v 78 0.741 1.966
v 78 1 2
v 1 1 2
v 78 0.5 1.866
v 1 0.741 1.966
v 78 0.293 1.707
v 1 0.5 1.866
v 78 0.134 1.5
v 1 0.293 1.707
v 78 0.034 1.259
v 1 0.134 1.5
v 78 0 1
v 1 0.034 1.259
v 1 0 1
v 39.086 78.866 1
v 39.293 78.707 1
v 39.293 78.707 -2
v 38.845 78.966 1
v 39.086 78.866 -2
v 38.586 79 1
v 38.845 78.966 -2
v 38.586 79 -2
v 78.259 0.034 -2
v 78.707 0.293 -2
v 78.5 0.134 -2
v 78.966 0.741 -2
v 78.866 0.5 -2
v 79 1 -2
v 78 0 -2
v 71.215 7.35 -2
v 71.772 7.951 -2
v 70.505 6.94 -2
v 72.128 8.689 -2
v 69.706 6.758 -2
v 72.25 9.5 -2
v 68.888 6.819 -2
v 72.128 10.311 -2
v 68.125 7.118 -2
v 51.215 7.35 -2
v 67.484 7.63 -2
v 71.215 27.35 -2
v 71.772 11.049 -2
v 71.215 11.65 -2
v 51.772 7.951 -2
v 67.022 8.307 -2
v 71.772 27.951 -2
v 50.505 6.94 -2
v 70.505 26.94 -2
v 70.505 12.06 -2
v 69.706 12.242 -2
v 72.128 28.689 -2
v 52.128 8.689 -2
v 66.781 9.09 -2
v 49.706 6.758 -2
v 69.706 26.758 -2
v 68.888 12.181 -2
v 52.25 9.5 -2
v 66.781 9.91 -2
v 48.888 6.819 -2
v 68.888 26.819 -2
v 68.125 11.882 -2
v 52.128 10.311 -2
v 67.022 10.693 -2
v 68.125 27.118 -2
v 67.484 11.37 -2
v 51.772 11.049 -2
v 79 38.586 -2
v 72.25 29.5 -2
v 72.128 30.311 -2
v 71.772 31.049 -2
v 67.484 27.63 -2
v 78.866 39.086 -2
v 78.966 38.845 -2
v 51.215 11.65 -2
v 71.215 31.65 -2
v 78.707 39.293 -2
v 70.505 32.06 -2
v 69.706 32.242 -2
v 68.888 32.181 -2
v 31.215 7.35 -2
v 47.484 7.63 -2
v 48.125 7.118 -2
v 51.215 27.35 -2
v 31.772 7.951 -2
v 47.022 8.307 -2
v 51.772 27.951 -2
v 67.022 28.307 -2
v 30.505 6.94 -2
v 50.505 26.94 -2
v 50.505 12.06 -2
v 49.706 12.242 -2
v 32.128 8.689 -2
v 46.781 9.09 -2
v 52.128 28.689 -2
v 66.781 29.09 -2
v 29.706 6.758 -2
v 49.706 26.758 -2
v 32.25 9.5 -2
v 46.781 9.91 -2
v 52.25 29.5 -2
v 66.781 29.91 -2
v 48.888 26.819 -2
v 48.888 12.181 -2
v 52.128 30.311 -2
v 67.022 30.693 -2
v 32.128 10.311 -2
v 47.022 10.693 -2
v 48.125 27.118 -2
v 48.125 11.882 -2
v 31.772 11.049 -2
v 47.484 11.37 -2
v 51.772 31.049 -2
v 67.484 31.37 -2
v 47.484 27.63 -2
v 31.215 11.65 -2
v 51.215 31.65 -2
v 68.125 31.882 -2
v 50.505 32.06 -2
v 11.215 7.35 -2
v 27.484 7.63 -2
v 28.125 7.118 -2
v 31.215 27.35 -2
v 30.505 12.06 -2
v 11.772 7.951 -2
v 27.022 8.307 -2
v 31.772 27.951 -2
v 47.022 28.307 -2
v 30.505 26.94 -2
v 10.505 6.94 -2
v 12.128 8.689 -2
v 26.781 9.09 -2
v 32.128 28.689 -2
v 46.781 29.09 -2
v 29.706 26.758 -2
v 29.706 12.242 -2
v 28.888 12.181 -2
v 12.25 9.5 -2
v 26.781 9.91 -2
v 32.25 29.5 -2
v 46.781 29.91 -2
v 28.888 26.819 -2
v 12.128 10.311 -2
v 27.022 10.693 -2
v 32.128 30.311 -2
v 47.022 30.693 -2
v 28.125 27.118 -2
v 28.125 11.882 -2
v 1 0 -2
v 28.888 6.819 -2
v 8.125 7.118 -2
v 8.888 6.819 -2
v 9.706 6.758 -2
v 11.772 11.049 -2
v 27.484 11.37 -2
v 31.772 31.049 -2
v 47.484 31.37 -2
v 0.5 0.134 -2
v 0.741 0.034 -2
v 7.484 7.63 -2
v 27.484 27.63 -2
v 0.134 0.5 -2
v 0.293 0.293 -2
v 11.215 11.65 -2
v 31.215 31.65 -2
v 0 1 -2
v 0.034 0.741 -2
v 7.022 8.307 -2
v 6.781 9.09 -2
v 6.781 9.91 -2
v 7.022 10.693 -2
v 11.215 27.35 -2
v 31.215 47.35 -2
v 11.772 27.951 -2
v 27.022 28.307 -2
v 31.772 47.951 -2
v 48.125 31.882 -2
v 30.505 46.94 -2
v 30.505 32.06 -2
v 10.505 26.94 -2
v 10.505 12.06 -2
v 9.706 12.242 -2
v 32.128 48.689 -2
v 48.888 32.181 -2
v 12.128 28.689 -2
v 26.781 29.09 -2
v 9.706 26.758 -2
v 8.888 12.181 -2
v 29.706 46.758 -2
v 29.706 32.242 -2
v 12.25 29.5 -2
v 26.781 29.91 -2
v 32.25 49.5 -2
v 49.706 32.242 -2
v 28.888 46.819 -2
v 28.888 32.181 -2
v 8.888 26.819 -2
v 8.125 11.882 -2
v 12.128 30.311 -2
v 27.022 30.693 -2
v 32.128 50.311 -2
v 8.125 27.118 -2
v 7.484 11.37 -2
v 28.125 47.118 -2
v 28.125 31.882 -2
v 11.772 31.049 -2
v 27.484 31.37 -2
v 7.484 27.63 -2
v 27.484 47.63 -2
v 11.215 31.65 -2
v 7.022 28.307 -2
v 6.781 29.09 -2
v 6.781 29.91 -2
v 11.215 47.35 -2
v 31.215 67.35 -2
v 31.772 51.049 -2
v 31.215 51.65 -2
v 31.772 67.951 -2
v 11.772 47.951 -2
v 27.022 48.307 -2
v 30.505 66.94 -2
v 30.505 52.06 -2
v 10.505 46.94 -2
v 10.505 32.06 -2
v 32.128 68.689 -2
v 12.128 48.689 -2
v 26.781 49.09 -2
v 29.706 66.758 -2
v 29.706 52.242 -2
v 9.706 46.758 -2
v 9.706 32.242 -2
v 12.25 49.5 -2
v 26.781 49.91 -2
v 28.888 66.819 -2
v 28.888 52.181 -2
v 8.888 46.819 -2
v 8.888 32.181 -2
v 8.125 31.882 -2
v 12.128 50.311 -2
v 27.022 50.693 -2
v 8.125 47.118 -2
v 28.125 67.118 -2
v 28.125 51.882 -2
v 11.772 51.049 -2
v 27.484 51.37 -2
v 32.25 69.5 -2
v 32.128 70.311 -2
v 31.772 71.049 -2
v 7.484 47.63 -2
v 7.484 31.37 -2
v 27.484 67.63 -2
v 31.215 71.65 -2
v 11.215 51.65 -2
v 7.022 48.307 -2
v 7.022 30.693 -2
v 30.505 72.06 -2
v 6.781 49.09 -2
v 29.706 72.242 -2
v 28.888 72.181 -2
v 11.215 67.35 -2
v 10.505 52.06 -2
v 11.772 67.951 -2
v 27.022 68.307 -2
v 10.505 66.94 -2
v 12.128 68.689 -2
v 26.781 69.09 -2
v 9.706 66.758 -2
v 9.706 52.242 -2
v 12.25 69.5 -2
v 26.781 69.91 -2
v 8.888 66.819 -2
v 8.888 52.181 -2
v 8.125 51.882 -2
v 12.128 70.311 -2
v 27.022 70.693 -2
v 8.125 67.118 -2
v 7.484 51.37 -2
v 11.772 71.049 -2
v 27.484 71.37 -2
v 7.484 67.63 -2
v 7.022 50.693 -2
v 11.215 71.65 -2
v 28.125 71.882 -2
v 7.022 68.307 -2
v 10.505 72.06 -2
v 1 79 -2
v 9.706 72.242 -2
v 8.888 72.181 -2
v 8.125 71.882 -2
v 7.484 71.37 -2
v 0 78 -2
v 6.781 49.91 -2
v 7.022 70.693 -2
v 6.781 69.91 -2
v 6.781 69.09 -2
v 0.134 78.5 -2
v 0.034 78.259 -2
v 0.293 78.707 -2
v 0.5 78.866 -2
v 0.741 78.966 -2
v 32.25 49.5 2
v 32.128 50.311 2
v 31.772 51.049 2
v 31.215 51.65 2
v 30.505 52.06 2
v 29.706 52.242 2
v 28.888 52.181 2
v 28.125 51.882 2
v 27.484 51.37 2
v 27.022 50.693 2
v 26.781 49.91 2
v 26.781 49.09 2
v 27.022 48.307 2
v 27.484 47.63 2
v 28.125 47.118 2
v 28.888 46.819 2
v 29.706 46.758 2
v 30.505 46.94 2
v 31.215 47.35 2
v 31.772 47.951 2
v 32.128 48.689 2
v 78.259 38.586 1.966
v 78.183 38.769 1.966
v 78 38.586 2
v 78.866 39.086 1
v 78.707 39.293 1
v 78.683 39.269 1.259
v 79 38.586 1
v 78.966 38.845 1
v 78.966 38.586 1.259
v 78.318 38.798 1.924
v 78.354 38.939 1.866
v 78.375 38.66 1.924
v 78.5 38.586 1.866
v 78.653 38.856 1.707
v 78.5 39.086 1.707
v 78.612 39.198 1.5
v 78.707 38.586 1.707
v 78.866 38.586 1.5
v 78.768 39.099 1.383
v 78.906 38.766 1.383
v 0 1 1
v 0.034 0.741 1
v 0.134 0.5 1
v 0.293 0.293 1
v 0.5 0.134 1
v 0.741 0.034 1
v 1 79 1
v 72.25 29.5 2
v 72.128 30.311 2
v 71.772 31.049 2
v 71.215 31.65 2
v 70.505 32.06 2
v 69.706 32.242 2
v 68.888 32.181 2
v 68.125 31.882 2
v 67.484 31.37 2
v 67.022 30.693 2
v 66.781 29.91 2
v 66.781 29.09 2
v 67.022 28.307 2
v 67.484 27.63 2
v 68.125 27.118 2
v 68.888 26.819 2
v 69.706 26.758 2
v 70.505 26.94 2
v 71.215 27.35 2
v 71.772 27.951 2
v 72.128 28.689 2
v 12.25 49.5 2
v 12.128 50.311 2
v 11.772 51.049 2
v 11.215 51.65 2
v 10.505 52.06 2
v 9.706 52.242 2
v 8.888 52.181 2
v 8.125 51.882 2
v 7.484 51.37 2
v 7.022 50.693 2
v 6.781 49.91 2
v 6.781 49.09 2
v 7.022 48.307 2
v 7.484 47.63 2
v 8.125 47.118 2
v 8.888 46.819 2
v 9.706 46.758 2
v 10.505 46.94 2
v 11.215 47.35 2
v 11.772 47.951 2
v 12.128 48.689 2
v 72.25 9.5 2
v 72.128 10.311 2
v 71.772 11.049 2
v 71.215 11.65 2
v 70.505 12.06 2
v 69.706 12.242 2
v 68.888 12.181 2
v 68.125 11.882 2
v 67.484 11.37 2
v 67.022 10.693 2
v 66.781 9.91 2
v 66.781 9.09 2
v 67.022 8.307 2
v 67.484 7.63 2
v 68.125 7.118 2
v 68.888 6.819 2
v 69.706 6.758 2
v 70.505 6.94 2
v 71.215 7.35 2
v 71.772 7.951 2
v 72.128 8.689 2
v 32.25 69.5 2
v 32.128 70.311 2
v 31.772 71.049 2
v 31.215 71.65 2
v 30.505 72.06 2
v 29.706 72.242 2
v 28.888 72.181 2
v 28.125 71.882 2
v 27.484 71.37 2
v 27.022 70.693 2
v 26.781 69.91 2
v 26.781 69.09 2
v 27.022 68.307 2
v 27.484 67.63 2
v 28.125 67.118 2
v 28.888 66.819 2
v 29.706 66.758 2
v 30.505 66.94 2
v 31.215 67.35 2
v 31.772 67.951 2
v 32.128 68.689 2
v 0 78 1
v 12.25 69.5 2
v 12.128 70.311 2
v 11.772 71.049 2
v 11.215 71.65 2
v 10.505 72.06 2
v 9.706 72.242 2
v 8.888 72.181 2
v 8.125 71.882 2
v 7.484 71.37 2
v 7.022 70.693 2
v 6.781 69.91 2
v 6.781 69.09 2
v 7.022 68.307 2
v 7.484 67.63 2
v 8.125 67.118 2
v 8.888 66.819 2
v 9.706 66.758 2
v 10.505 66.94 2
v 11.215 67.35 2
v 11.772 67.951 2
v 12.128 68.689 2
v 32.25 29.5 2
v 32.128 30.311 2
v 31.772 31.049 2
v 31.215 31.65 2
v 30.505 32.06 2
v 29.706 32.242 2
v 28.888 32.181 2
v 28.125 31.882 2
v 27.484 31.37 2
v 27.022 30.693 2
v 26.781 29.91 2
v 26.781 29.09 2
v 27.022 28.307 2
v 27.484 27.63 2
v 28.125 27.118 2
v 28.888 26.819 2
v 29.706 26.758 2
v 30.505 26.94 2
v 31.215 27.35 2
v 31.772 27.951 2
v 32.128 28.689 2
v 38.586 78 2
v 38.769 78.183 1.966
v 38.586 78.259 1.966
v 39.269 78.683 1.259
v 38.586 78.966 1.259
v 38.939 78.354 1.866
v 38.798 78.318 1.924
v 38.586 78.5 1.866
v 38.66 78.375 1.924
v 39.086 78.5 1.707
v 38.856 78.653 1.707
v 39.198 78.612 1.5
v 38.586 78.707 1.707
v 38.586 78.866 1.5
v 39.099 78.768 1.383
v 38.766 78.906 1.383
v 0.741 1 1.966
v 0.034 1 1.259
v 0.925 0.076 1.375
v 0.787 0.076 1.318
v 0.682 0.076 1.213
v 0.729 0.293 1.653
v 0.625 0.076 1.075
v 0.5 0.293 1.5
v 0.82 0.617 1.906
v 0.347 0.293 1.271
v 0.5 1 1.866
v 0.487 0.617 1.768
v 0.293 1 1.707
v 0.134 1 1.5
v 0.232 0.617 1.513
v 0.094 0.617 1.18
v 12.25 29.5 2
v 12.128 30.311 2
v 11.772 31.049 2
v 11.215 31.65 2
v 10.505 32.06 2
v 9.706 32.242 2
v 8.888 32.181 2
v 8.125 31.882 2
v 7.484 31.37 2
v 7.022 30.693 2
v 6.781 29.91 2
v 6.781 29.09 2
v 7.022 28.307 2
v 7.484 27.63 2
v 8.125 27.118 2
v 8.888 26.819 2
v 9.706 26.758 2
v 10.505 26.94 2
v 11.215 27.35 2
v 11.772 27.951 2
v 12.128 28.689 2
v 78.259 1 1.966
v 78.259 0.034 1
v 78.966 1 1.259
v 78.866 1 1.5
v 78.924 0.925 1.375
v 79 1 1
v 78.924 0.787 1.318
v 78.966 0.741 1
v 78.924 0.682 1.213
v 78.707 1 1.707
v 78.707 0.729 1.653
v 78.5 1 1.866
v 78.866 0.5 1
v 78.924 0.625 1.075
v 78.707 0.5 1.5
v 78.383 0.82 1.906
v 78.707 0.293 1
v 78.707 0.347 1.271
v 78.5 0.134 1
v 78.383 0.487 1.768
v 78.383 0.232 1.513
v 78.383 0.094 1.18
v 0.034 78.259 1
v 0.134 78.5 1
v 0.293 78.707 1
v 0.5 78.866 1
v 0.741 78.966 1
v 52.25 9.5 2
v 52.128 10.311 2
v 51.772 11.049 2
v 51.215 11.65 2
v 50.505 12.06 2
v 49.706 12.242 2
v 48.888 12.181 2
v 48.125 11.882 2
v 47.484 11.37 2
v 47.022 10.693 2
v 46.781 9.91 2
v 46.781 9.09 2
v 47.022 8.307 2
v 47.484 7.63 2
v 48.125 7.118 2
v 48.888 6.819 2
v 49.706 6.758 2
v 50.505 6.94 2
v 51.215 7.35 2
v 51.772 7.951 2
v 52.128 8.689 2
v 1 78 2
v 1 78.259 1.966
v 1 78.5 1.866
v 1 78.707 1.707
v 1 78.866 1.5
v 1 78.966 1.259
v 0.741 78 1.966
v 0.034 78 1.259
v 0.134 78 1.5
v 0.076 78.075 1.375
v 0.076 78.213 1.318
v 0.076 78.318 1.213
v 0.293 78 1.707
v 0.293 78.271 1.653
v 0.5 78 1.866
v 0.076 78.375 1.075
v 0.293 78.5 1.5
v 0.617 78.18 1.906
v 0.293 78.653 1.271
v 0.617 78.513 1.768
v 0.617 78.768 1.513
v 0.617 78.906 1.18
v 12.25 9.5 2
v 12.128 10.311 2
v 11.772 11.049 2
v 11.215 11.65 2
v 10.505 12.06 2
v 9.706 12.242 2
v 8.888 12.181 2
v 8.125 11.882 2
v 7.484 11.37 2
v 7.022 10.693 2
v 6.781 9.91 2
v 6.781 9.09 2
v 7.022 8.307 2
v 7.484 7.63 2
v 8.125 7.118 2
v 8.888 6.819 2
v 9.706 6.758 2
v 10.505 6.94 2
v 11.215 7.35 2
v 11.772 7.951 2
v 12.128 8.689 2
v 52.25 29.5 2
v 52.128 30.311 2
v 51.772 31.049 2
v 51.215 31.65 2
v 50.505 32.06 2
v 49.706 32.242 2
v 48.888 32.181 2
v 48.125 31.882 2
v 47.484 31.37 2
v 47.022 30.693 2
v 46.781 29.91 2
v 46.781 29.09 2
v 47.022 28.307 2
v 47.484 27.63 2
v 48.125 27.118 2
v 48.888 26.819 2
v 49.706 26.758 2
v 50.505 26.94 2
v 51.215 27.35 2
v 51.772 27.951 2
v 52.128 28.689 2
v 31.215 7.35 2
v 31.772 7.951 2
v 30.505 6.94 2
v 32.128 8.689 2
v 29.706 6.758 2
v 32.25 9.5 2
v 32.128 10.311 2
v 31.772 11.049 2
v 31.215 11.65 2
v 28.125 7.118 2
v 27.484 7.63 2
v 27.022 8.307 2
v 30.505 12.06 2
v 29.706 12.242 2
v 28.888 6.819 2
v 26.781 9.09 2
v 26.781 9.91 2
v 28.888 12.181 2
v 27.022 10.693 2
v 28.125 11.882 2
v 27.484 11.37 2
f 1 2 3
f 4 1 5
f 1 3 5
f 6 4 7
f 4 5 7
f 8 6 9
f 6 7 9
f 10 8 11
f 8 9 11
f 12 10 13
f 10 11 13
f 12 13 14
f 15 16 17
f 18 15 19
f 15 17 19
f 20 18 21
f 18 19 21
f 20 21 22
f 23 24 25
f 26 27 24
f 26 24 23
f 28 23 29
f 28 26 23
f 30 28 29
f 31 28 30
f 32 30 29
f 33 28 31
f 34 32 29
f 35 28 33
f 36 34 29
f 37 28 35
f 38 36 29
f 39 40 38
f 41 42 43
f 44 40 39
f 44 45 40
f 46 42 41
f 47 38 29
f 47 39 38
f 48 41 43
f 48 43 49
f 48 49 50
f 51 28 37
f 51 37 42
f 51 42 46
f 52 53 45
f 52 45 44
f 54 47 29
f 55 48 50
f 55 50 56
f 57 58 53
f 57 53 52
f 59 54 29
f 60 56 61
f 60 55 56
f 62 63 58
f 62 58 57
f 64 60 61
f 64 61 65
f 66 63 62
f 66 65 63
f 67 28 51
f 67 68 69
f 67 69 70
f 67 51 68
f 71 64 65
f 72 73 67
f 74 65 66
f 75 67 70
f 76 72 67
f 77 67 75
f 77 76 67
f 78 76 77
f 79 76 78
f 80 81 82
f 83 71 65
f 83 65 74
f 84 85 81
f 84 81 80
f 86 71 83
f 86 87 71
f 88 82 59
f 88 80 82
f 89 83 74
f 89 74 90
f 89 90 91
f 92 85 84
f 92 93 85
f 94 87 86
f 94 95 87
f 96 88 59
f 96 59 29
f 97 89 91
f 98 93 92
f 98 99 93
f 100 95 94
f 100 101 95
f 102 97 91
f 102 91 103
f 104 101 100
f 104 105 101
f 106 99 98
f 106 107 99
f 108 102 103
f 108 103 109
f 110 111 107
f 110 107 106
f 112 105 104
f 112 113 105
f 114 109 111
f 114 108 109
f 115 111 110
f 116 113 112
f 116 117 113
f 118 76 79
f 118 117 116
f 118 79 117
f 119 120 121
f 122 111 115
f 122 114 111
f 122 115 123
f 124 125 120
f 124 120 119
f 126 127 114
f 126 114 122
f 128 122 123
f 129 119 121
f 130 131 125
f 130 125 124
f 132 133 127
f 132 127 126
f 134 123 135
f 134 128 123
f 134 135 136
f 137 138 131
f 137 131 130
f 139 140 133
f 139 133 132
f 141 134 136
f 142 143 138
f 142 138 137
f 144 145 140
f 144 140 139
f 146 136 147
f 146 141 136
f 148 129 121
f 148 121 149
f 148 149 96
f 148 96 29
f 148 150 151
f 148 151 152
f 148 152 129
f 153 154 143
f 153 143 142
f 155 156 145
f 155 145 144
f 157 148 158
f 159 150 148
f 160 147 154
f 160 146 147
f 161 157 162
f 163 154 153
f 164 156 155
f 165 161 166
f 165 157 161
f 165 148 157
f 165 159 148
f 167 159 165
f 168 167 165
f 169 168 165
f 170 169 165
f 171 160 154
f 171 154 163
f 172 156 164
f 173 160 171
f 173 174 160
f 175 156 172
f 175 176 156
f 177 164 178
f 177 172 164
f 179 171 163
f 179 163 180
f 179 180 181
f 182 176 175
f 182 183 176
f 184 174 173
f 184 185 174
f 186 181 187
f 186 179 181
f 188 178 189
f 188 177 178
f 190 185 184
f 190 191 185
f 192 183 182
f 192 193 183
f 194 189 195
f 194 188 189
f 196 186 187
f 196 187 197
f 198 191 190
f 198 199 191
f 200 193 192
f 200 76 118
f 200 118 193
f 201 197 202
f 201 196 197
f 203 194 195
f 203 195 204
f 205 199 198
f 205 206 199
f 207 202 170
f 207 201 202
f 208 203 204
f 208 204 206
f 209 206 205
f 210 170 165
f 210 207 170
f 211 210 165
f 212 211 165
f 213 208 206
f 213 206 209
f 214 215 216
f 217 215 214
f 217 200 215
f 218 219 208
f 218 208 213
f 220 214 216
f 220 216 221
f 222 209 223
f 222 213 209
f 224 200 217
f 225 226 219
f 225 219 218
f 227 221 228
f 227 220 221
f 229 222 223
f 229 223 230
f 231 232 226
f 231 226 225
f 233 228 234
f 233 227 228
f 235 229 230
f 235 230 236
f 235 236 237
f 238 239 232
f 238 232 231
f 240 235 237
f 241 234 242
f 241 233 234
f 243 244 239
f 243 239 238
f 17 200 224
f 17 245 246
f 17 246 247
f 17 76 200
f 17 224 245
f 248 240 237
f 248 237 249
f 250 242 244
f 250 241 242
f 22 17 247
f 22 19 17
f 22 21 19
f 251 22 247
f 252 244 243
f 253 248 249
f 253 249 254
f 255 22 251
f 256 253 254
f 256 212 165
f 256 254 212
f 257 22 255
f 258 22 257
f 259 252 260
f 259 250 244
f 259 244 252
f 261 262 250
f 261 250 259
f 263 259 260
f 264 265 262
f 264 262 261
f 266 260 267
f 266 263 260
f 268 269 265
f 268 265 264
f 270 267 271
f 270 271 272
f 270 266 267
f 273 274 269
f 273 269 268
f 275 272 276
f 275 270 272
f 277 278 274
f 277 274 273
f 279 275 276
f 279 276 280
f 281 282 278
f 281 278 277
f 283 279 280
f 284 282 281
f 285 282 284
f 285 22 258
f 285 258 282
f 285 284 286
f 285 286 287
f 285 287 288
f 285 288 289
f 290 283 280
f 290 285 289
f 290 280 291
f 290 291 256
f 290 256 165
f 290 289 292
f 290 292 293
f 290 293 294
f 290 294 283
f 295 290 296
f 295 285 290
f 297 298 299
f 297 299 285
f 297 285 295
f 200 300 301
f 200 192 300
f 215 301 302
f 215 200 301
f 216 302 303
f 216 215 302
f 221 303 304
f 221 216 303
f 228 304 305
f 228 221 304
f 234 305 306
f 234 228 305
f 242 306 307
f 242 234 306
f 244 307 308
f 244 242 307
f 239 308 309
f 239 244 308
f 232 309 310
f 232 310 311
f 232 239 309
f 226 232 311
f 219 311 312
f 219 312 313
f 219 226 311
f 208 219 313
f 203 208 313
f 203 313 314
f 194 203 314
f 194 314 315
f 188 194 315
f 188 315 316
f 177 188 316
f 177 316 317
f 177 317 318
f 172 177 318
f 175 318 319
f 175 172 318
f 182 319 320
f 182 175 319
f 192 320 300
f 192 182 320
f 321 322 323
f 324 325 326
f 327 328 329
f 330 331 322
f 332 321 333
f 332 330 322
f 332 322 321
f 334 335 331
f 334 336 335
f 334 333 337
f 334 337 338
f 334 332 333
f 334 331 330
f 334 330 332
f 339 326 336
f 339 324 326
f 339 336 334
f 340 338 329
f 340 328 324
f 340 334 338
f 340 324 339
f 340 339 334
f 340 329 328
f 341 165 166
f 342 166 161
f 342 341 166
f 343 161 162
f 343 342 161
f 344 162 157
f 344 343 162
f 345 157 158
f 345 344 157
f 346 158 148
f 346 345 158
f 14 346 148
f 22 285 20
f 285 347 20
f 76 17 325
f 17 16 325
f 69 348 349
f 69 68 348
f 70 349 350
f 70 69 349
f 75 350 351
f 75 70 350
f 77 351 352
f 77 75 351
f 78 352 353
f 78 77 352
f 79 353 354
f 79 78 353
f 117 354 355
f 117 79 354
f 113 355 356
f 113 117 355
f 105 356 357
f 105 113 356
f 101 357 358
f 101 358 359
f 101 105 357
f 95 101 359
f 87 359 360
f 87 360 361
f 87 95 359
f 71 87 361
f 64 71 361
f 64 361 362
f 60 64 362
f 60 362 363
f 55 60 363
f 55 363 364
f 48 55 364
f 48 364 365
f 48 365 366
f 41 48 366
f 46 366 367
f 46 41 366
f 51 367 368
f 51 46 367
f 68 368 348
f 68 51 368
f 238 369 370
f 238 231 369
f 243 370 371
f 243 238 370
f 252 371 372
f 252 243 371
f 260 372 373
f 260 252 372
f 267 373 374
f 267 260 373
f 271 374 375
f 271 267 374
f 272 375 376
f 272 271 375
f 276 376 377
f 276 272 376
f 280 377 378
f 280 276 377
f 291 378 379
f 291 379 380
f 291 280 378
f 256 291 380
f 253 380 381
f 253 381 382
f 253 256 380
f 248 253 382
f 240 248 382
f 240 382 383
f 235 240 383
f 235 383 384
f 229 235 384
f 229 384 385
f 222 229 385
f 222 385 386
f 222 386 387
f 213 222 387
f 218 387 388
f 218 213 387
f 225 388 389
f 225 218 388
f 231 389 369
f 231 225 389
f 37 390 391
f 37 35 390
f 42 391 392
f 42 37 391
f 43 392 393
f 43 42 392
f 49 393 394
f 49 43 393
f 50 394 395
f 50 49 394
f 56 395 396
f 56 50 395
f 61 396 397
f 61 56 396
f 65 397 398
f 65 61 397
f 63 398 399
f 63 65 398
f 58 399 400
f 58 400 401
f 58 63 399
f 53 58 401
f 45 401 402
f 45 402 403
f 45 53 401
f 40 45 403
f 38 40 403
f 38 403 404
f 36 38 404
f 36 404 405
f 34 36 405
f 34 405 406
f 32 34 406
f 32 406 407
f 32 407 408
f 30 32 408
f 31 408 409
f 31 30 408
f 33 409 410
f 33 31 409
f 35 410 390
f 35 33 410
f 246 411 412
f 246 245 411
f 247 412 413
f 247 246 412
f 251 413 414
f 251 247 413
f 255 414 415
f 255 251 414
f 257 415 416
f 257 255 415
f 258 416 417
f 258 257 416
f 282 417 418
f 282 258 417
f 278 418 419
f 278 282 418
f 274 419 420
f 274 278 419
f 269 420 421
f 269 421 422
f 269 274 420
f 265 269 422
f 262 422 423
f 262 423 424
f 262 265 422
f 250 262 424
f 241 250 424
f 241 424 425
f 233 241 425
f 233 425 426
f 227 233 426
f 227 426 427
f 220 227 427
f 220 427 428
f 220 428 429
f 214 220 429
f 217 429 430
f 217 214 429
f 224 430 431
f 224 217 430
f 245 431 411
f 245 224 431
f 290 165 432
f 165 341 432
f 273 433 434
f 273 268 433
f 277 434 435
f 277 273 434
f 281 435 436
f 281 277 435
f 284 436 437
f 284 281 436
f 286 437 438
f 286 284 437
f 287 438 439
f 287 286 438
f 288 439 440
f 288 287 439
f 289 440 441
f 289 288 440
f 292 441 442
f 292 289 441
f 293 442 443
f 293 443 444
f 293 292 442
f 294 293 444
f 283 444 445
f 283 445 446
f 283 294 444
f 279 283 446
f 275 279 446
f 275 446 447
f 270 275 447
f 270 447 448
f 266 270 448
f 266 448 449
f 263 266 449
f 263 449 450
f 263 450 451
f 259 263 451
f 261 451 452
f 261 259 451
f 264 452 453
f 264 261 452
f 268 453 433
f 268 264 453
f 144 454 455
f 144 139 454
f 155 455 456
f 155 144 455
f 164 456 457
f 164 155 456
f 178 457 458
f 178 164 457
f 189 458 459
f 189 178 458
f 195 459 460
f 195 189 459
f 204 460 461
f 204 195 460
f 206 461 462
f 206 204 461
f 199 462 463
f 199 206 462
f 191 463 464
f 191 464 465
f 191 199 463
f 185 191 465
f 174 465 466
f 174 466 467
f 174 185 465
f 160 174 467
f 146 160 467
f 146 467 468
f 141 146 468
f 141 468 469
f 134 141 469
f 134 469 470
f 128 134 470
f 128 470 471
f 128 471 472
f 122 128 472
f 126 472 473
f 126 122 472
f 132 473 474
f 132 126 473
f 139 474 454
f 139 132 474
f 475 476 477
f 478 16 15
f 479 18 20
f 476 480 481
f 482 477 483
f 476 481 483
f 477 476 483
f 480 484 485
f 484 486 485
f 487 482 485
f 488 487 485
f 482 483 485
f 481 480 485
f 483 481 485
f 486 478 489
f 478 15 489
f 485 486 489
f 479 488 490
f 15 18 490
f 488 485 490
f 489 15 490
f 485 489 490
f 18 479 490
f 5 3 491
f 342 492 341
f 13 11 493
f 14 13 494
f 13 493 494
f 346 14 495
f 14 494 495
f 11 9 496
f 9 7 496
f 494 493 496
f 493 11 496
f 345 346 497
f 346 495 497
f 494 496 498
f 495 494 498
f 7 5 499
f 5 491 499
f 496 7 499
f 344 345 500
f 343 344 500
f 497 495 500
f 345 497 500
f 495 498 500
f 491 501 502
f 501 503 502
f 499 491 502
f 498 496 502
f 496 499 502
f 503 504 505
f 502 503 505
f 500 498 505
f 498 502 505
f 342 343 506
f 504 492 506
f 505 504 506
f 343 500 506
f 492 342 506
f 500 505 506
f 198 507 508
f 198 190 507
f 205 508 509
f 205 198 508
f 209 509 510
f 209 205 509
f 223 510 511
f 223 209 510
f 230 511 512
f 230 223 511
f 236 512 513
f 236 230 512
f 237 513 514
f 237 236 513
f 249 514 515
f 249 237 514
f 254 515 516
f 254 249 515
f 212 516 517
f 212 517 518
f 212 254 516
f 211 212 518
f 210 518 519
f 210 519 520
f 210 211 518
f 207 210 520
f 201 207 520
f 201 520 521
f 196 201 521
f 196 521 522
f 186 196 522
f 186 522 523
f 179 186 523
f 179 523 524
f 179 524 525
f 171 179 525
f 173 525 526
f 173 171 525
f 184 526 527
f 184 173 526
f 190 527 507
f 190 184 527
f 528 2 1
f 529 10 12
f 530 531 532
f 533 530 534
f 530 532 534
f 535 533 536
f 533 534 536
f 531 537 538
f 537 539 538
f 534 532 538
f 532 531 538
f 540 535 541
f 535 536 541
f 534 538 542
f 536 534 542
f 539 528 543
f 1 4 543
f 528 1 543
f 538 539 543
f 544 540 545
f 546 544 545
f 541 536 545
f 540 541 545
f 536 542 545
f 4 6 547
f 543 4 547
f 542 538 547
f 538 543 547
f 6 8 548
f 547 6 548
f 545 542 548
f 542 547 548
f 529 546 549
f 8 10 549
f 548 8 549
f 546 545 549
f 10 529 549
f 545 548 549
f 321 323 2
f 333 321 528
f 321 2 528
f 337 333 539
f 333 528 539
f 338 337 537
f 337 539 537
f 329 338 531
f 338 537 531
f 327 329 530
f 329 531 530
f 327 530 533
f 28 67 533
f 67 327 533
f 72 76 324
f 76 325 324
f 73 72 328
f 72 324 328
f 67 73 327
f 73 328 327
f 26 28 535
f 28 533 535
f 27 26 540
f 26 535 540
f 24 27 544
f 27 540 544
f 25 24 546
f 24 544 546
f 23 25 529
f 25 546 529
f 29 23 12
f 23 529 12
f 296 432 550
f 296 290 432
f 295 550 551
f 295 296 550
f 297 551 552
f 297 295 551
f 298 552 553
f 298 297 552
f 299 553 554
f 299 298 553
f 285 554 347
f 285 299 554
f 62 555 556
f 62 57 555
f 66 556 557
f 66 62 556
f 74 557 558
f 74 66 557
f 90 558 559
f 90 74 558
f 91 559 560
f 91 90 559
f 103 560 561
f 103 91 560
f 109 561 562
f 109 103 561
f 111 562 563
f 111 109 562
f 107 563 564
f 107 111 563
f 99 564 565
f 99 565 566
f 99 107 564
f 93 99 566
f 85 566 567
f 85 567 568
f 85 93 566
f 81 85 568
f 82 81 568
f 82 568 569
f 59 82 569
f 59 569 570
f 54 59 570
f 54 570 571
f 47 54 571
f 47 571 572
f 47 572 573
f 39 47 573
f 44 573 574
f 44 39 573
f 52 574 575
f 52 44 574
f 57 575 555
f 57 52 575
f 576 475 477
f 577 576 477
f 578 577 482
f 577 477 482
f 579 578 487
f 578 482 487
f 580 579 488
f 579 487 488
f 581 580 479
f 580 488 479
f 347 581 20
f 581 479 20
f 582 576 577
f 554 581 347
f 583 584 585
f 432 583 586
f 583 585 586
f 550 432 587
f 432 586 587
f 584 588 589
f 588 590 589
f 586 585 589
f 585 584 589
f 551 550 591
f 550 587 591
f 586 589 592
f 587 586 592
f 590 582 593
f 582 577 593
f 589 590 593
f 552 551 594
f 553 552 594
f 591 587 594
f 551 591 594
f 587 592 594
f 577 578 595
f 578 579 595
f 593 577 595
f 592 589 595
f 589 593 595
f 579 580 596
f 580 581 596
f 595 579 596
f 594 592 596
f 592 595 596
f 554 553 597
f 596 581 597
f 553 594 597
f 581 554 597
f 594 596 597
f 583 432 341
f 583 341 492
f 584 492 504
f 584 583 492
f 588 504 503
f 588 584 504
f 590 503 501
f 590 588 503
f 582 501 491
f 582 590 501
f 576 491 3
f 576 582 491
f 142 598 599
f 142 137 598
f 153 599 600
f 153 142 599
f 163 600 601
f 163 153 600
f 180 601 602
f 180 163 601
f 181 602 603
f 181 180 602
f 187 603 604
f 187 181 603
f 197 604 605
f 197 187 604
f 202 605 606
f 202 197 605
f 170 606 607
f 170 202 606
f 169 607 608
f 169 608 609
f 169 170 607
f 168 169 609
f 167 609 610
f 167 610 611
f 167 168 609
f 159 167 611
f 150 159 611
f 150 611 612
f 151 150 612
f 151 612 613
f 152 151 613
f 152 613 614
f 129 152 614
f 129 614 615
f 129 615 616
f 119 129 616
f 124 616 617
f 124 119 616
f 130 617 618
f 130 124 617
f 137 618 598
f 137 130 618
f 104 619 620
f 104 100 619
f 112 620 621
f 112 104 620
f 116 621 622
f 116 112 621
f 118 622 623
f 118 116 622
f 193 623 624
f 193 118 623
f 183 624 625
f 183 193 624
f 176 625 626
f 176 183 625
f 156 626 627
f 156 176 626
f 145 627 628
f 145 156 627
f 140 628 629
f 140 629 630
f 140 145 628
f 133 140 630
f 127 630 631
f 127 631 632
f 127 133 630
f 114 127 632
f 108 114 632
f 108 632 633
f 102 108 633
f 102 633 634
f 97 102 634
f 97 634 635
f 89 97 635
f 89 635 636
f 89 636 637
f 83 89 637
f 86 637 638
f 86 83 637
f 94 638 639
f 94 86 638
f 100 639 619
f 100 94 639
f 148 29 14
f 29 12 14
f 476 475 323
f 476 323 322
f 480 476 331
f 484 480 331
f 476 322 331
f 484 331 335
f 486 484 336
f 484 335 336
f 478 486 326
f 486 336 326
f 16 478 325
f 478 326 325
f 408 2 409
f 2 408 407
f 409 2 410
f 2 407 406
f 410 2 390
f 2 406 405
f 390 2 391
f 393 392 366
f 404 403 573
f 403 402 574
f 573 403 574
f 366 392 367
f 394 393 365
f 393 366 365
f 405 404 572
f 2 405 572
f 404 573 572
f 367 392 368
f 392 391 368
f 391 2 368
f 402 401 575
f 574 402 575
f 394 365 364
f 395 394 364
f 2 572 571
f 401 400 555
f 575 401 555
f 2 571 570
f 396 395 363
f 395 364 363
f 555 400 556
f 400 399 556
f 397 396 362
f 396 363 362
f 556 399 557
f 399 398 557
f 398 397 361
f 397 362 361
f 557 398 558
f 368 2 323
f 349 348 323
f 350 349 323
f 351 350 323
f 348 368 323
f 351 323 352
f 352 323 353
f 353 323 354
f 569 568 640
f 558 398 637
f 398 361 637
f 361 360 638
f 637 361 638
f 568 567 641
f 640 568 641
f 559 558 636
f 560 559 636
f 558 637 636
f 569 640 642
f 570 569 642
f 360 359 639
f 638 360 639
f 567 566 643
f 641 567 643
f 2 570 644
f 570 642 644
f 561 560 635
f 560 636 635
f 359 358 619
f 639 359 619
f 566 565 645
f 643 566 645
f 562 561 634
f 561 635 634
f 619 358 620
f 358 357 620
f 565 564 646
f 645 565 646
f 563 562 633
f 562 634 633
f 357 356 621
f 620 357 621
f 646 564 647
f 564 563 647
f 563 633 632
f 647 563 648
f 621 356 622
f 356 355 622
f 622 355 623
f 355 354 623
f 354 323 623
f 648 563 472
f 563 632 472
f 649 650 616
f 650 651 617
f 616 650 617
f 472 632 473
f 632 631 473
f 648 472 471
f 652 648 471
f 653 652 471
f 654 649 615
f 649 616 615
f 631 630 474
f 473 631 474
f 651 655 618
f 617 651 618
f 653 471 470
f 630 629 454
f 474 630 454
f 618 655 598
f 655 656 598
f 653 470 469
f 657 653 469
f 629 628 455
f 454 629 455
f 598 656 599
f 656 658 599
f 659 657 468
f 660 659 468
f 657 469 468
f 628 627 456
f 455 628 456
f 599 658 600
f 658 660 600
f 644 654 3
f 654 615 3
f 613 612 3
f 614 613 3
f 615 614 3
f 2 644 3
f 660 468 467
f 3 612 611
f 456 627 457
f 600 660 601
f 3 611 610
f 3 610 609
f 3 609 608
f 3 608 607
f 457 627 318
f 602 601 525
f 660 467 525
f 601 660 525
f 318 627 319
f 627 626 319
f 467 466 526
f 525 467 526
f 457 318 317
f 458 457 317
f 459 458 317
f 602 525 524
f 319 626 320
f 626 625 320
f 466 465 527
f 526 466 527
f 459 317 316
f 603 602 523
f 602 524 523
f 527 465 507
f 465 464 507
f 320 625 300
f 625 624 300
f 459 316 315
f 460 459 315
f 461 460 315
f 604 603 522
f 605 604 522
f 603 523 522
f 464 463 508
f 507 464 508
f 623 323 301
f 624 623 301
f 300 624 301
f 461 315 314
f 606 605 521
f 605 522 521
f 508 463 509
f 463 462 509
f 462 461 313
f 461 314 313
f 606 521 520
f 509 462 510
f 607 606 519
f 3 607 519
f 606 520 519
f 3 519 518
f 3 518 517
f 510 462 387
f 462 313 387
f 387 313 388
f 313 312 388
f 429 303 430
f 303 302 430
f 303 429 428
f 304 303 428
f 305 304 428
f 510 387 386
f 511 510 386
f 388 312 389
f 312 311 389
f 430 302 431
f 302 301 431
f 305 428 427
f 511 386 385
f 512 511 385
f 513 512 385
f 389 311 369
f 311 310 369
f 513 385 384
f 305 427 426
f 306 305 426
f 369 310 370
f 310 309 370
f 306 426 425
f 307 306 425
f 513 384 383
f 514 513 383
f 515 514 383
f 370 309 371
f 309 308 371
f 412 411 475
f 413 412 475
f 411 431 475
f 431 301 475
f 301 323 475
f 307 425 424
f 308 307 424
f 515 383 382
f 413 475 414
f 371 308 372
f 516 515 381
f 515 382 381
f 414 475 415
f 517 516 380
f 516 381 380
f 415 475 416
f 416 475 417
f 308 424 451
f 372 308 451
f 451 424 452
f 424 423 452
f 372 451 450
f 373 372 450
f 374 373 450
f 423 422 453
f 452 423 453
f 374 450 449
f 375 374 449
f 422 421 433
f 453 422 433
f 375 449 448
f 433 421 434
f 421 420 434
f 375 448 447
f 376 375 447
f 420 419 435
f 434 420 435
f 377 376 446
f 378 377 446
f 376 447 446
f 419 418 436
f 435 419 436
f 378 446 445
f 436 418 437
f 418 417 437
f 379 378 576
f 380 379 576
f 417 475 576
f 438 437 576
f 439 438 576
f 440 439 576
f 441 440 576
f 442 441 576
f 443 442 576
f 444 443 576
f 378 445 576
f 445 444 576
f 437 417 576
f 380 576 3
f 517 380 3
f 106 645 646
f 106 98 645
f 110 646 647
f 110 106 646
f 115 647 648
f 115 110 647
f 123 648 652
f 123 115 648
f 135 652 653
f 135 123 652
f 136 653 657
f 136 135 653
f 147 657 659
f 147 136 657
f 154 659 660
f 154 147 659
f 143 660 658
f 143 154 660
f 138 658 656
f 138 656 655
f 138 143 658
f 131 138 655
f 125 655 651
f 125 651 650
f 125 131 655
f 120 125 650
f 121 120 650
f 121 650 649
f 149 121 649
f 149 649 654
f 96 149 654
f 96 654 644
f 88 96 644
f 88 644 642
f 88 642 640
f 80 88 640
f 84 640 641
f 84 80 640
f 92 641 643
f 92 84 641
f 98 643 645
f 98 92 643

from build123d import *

# Parameters (mm, degrees)
SKETCH1_R           = 2.75
BOSS_EXTRUDE1_DEPTH = 2
FILLET1_R           = 1


with BuildPart() as part:
    # Sketch1 → Boss-Extrude1 (new, symmetric)
    with BuildSketch(Plane.XY):
        Polygon((0, 0), (0, 79), (39, 79), (79, 39), (79, 0), align=None)
        with Locations((9.5, 9.5)):
            Circle(SKETCH1_R, mode=Mode.SUBTRACT)
        with Locations((29.5, 9.5)):
            Circle(SKETCH1_R, mode=Mode.SUBTRACT)
        with Locations((49.5, 9.5)):
            Circle(SKETCH1_R, mode=Mode.SUBTRACT)
        with Locations((9.5, 29.5)):
            Circle(SKETCH1_R, mode=Mode.SUBTRACT)
        with Locations((9.5, 49.5)):
            Circle(SKETCH1_R, mode=Mode.SUBTRACT)
        with Locations((69.5, 9.5)):
            Circle(SKETCH1_R, mode=Mode.SUBTRACT)
        with Locations((69.5, 29.5)):
            Circle(SKETCH1_R, mode=Mode.SUBTRACT)
        with Locations((49.5, 29.5)):
            Circle(SKETCH1_R, mode=Mode.SUBTRACT)
        with Locations((29.5, 29.5)):
            Circle(SKETCH1_R, mode=Mode.SUBTRACT)
        with Locations((29.5, 49.5)):
            Circle(SKETCH1_R, mode=Mode.SUBTRACT)
        with Locations((29.5, 69.5)):
            Circle(SKETCH1_R, mode=Mode.SUBTRACT)
        with Locations((9.5, 69.5)):
            Circle(SKETCH1_R, mode=Mode.SUBTRACT)
    extrude(amount=BOSS_EXTRUDE1_DEPTH, both=True)

    # Fillet1
    fillet1_edges = [part.edges().sort_by_distance(p)[0] for p in [
        (59, 59, 2),
        (19.5, 79, 2),
        (0, 39.5, 2),
        (39.5, 0, 2),
        (79, 19.5, 2),
        (0, 0, 0),
        (0, 79, 0),
        (39, 79, 0),
        (79, 39, 0),
        (79, 0, 0),
    ]]
    fillet(fillet1_edges, radius=FILLET1_R)


solid = part.part
